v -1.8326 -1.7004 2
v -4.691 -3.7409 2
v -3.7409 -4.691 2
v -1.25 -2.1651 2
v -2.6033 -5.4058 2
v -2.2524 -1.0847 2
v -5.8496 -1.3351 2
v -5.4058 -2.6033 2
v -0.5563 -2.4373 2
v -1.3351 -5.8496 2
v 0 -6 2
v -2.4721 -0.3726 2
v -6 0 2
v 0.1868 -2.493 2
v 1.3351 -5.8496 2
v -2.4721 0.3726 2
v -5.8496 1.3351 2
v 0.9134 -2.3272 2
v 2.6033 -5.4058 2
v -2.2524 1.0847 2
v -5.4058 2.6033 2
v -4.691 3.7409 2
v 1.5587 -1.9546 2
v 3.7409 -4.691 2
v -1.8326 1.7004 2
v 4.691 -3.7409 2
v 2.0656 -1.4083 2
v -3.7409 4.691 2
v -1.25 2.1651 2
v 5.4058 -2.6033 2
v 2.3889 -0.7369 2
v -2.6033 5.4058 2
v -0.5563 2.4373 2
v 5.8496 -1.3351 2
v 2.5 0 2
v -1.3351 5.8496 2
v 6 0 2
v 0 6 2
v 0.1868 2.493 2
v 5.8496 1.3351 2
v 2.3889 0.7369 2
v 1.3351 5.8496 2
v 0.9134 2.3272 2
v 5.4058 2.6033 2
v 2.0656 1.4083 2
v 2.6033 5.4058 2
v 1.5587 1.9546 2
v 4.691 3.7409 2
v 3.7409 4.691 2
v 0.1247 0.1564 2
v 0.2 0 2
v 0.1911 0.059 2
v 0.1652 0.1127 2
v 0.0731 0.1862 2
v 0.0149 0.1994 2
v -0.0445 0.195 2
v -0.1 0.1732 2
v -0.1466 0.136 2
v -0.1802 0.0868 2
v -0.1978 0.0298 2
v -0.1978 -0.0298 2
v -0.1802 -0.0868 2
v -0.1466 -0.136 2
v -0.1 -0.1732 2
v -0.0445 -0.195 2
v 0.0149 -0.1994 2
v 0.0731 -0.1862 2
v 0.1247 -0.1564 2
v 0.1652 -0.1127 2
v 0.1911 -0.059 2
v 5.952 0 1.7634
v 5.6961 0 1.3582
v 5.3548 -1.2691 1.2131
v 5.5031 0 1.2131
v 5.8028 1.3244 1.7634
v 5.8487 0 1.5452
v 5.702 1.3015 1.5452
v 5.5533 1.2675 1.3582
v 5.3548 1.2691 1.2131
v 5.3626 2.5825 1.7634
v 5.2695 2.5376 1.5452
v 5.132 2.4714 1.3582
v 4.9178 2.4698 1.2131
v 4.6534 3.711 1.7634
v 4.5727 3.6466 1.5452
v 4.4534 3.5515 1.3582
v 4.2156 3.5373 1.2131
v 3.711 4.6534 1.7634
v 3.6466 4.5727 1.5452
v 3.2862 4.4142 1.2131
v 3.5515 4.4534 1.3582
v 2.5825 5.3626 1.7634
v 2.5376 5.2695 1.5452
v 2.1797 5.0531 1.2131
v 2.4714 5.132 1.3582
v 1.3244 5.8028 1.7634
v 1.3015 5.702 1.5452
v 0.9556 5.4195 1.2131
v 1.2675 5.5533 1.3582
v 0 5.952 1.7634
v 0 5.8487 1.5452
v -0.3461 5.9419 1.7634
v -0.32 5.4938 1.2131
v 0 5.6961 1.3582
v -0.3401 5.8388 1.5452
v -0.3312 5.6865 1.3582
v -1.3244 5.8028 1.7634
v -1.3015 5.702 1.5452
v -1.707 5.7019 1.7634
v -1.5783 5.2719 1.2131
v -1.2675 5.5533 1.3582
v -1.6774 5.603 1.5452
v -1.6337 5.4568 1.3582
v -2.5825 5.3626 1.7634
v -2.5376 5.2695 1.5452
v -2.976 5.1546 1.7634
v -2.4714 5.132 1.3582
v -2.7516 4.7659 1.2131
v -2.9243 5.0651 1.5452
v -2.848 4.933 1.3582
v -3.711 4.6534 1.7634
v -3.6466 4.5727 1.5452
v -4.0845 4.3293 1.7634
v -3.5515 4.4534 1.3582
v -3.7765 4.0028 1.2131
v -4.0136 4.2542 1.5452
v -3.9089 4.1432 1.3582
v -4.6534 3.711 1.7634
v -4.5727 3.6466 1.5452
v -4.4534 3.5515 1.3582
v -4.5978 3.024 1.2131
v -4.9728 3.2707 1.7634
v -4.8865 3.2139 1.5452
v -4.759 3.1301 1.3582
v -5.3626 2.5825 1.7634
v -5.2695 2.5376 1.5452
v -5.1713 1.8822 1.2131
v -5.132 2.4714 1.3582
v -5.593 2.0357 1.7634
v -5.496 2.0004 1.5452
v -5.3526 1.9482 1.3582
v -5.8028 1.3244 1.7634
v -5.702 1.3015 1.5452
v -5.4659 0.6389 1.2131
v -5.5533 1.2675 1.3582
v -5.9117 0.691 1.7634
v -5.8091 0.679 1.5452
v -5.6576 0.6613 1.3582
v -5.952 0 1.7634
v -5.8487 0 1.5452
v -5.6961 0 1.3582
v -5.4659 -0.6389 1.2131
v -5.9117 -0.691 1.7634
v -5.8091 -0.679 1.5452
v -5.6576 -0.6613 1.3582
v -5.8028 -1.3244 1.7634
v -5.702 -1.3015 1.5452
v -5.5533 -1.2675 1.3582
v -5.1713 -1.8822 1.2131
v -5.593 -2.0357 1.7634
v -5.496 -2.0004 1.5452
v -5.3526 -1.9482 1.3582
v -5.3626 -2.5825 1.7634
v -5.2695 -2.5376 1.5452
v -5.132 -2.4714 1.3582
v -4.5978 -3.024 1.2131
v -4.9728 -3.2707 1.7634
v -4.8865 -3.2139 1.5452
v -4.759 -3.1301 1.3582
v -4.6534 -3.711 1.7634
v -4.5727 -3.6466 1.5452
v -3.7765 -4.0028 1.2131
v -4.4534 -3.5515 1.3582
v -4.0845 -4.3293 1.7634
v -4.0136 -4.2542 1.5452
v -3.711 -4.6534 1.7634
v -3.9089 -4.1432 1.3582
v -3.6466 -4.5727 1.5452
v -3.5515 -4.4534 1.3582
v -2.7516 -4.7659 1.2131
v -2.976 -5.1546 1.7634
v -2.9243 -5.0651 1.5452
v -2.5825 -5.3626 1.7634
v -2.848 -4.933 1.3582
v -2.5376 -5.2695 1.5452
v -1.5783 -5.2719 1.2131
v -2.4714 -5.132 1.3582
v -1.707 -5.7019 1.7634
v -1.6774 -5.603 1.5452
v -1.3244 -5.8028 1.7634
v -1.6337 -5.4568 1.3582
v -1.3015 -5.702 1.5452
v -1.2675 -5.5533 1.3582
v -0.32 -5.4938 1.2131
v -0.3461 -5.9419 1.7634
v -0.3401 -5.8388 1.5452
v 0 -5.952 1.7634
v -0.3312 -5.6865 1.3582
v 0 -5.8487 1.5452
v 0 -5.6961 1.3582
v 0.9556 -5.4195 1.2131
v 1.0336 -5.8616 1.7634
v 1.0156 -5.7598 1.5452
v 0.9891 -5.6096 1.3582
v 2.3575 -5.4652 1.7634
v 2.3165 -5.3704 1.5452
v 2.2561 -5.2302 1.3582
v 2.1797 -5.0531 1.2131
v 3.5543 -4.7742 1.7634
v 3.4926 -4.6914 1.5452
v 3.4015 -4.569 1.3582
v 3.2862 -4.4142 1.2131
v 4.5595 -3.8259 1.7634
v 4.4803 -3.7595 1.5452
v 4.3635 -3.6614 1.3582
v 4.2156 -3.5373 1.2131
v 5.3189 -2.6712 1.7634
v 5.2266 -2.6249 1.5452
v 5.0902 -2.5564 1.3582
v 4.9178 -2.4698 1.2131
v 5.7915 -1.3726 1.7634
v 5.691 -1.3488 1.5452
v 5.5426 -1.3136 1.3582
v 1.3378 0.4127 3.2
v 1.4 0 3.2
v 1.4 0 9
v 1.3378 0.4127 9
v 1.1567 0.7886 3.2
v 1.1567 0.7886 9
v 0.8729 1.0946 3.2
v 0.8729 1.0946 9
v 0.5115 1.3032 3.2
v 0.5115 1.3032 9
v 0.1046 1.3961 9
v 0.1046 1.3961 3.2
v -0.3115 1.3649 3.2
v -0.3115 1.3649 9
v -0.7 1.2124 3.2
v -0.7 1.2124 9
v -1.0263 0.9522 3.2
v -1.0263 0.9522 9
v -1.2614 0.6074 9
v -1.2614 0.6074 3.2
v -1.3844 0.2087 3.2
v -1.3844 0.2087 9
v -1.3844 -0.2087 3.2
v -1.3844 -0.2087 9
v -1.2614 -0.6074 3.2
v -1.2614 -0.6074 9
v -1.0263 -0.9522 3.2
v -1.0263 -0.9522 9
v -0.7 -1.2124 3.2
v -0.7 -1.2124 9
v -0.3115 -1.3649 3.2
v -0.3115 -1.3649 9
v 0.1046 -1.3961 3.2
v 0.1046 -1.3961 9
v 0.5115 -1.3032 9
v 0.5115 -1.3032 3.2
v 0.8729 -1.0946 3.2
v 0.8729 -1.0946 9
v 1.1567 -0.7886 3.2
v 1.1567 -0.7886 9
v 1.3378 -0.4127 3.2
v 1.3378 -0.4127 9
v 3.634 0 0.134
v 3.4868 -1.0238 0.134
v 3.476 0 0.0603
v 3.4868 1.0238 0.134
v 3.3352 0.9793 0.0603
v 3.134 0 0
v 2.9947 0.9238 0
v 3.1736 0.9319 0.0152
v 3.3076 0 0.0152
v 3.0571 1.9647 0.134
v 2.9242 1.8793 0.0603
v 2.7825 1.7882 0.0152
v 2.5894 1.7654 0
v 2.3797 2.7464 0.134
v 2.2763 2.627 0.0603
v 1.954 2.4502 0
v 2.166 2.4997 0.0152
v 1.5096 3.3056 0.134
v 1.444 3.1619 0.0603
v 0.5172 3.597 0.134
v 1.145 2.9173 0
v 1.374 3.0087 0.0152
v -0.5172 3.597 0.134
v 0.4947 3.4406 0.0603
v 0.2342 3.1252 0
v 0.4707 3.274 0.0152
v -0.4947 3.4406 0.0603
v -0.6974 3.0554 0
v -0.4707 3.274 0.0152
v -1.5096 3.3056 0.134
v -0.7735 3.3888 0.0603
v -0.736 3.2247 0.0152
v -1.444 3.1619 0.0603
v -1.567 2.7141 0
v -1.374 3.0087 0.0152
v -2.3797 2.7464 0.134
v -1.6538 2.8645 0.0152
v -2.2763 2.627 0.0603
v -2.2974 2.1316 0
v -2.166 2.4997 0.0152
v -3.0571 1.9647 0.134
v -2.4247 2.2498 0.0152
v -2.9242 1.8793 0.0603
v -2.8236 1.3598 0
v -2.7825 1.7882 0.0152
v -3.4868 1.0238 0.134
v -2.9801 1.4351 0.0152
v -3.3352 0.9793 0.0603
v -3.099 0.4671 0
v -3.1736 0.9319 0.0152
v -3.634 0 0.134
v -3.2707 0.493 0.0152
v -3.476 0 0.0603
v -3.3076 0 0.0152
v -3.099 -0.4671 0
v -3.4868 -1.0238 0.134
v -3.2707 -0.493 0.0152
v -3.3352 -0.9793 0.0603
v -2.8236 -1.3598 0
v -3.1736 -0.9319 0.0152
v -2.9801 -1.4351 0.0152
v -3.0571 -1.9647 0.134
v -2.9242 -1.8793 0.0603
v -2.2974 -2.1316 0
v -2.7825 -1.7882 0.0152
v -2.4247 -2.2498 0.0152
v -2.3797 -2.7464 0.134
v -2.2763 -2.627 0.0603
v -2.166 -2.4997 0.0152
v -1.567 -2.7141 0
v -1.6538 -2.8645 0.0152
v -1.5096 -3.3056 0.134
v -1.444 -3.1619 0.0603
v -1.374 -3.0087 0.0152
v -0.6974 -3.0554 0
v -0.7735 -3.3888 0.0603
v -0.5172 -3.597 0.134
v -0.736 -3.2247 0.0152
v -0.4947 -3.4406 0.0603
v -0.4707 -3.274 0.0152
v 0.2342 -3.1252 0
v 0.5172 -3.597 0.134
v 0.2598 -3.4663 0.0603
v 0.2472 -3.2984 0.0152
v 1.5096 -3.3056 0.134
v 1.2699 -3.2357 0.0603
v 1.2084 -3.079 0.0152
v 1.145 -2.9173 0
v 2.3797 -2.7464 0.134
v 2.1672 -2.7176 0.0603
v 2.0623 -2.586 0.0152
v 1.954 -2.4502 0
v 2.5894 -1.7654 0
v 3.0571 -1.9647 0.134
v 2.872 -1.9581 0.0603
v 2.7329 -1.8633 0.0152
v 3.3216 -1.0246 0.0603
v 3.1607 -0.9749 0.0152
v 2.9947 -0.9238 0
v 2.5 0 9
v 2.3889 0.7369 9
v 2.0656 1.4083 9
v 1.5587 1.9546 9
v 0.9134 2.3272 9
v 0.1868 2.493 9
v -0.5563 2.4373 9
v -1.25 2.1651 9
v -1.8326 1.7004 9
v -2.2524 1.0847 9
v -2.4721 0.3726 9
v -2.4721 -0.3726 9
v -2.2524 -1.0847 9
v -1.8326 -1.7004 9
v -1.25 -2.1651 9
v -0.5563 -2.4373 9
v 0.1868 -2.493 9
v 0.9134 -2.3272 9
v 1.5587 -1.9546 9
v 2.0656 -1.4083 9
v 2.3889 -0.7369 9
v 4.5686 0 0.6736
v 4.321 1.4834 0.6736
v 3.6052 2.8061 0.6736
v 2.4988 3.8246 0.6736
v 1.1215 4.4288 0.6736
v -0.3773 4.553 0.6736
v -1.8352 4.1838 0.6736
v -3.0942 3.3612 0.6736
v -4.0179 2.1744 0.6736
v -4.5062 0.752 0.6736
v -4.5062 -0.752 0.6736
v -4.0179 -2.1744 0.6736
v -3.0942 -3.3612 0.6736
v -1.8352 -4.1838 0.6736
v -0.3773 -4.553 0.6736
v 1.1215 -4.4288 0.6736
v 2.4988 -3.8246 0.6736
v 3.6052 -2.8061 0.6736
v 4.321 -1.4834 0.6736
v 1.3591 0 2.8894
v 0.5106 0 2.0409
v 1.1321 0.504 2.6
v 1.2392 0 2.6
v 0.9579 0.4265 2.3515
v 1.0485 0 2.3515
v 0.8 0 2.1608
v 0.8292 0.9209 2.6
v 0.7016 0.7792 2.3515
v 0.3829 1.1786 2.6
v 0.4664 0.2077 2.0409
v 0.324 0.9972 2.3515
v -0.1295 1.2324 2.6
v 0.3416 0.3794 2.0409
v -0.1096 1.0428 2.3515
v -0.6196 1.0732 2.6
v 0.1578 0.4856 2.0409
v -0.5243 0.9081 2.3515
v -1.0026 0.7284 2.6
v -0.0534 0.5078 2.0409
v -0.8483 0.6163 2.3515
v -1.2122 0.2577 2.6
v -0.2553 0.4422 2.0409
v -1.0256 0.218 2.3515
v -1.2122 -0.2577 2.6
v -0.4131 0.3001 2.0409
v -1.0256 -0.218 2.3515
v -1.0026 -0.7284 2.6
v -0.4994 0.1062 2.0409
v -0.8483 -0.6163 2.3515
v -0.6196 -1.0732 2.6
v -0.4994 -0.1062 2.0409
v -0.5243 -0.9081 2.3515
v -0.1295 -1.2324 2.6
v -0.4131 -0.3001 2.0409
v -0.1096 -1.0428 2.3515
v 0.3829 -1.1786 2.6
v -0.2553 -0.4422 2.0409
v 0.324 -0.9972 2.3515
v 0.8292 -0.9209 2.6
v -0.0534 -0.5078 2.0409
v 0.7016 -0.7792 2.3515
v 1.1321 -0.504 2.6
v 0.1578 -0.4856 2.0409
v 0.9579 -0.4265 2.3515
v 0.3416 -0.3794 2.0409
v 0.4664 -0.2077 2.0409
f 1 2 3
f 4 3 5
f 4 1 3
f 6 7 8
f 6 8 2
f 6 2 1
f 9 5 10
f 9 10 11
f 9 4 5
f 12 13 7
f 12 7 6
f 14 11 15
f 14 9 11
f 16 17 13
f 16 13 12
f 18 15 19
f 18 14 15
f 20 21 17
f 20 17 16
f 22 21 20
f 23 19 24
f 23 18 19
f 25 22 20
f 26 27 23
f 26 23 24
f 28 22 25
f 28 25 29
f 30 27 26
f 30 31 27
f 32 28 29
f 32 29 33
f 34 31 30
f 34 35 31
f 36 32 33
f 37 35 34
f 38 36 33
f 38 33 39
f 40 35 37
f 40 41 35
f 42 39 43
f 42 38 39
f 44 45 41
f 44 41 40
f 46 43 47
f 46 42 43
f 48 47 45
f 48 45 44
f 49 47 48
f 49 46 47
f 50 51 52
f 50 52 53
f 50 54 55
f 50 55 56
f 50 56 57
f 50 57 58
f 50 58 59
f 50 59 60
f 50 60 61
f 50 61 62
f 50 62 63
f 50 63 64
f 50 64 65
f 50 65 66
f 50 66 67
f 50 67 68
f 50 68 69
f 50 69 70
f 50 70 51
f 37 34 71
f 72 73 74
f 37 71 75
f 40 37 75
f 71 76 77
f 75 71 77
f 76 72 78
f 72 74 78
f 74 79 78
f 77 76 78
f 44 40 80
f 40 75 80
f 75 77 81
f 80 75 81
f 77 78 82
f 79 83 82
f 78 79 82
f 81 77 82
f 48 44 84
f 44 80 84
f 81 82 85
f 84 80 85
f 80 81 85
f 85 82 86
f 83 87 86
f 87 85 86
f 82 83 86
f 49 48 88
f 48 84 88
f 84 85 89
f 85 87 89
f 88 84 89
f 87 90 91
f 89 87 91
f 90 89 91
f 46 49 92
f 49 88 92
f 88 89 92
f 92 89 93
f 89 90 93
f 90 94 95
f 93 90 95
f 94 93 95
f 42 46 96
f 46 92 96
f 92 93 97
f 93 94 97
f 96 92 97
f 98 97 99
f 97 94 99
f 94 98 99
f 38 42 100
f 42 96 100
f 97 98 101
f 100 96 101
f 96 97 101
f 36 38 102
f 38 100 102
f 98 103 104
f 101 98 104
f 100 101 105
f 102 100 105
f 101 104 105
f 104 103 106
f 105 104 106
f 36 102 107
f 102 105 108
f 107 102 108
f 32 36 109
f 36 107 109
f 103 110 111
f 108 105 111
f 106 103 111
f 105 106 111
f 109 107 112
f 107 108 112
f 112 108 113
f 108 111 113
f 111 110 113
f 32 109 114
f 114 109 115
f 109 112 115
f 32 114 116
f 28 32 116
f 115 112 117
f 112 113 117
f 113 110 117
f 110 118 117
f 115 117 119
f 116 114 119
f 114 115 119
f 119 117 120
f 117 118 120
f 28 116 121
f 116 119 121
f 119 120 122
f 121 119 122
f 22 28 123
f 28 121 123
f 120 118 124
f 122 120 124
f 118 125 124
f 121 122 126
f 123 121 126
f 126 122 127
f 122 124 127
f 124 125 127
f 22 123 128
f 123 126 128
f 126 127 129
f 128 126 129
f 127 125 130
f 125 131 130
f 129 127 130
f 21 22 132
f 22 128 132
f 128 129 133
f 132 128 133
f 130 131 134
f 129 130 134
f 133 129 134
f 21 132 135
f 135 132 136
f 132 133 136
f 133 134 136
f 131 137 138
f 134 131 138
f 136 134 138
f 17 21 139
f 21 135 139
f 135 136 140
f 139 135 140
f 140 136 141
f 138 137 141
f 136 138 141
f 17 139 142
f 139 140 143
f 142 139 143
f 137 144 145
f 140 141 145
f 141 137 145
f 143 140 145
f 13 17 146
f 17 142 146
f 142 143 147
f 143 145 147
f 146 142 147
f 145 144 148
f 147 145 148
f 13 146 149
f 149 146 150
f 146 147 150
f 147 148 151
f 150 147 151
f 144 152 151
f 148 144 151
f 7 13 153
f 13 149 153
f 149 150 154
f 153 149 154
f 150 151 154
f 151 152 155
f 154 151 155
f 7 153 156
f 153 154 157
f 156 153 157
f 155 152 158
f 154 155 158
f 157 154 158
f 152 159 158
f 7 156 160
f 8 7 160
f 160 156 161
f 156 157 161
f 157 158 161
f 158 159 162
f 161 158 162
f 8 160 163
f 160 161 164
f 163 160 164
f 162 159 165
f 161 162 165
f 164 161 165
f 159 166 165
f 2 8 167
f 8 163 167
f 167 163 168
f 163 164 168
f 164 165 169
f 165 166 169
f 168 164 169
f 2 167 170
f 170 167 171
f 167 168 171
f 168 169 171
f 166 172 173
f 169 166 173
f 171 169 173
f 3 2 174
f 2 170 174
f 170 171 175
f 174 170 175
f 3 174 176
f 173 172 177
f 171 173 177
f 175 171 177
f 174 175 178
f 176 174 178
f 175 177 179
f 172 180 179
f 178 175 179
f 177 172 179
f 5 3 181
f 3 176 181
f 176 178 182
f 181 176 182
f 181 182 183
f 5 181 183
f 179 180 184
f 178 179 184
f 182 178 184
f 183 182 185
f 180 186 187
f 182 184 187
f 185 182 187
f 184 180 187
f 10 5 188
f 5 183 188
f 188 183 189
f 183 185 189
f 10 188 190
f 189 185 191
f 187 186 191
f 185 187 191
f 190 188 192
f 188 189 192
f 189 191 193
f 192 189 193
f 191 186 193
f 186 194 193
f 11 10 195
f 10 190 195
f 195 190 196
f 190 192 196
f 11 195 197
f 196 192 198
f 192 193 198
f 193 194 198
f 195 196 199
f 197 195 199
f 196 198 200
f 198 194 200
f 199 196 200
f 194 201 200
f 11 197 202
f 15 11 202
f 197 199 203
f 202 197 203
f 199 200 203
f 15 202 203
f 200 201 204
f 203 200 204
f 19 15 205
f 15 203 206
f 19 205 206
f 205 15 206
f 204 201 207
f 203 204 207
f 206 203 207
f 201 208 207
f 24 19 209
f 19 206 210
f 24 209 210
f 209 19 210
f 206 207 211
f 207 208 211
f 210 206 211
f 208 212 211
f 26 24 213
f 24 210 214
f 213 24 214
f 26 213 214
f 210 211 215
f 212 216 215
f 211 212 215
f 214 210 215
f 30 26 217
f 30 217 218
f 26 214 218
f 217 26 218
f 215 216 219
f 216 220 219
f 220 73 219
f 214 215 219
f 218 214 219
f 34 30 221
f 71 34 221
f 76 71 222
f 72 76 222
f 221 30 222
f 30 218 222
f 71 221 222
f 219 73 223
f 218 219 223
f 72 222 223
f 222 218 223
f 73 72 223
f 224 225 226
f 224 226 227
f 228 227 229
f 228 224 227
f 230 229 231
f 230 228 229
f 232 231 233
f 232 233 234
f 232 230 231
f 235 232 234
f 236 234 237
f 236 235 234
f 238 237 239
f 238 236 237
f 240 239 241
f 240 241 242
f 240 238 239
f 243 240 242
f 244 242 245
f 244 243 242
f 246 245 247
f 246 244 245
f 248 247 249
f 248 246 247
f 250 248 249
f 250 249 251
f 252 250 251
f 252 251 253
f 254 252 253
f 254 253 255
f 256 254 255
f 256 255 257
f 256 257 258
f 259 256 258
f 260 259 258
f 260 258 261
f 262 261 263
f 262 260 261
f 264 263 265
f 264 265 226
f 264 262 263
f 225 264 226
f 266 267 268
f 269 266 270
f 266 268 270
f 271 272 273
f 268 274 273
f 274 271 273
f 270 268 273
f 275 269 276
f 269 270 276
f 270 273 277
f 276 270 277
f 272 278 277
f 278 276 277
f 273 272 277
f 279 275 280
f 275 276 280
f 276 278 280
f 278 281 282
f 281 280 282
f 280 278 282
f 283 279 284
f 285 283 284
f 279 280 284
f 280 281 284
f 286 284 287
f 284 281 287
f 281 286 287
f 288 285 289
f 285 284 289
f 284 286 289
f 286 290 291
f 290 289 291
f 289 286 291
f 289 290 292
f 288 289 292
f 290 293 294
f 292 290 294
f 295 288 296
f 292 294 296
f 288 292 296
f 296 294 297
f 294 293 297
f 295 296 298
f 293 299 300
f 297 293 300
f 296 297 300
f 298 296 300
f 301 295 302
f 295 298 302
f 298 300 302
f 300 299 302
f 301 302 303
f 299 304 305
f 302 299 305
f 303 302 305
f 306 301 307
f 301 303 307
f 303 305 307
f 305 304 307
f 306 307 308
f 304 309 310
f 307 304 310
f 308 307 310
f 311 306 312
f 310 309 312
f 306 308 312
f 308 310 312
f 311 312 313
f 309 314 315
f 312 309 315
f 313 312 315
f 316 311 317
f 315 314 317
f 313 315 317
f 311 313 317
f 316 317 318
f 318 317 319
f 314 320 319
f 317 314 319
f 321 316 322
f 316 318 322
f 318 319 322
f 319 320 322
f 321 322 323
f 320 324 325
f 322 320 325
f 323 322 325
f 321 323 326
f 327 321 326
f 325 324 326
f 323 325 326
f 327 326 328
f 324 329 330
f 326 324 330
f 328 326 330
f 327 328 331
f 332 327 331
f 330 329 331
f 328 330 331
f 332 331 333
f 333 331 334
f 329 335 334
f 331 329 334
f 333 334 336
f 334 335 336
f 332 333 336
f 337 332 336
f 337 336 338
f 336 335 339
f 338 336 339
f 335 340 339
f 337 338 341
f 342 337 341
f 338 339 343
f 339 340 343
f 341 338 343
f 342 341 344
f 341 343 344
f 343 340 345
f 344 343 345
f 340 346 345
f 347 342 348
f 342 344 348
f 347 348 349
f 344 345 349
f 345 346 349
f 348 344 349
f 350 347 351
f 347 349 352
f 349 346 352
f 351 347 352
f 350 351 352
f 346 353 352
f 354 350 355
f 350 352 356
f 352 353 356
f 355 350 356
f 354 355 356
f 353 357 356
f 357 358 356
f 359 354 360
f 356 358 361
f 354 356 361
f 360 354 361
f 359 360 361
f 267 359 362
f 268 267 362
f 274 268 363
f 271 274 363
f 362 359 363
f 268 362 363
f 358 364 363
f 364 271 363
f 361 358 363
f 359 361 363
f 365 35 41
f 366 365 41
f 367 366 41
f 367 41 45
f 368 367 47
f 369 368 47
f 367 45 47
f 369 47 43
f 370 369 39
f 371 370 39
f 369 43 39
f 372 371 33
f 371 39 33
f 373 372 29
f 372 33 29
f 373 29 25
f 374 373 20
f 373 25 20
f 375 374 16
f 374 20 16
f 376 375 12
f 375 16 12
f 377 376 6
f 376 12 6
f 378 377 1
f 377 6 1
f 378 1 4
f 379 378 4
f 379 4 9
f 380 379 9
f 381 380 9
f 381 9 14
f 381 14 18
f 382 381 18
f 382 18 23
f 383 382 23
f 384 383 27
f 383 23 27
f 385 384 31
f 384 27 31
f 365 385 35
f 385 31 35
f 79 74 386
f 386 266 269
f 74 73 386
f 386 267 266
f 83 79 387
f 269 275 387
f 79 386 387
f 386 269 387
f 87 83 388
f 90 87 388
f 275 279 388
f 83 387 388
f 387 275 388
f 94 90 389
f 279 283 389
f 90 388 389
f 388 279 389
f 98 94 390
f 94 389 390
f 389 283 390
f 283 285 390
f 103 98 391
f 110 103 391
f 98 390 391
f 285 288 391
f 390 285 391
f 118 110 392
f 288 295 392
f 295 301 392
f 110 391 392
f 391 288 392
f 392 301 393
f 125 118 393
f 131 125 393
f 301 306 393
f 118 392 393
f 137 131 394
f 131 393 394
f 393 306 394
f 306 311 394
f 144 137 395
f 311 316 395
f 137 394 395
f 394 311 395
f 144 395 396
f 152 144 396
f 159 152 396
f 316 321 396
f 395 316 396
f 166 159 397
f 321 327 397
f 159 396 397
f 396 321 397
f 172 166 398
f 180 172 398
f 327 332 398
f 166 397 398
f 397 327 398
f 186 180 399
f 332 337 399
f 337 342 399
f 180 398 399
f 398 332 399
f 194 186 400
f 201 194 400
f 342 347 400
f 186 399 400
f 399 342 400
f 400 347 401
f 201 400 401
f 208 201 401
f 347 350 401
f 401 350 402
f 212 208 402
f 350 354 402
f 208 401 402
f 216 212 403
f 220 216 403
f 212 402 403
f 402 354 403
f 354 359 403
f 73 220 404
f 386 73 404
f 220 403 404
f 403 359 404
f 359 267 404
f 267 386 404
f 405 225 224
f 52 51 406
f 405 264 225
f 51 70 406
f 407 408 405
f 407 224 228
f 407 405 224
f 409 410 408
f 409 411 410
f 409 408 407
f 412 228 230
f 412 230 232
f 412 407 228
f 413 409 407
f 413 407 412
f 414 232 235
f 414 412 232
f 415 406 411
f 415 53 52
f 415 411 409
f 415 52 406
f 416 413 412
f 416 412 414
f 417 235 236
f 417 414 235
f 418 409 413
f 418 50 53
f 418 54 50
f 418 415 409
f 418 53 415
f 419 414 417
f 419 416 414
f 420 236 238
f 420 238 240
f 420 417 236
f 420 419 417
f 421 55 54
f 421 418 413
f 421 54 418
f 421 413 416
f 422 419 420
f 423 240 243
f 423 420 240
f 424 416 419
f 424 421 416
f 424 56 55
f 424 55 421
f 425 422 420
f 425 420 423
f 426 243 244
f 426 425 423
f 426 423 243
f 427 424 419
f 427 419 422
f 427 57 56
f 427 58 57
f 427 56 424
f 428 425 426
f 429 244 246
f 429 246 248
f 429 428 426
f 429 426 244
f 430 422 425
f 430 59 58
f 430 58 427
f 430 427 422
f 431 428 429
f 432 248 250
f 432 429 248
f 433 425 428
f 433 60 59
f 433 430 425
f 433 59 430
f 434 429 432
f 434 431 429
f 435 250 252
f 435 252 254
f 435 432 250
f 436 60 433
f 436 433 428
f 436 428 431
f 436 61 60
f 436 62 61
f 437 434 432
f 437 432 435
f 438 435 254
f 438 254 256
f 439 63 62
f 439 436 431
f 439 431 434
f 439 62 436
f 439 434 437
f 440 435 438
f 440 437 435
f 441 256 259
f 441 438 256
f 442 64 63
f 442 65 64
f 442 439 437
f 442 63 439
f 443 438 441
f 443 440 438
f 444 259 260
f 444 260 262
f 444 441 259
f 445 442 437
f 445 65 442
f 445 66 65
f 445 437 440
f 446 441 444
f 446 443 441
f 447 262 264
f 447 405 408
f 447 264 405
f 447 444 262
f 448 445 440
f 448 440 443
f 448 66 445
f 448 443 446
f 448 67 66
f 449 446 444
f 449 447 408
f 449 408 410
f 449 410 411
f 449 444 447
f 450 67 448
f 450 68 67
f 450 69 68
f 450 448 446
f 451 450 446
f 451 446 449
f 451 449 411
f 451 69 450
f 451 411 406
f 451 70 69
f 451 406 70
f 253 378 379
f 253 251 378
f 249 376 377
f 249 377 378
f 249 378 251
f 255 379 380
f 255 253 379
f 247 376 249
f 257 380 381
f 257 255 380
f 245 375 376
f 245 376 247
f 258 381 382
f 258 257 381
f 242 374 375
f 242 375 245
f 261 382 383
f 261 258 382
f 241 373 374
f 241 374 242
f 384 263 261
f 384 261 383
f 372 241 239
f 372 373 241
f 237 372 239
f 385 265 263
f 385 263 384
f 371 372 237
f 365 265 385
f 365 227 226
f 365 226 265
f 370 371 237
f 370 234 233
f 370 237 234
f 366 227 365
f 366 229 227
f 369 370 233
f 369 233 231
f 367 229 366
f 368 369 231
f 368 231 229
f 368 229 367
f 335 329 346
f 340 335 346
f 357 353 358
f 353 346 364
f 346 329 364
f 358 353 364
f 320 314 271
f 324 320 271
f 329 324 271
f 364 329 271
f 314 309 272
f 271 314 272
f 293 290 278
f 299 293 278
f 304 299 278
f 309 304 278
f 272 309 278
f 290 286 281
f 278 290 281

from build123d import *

# Parameters (mm, degrees)
F0_R     = 6
F1_DEPTH = 2
F2_SIZE2 = 2.5980762114
F2_SIZE  = 1.5
F4_R     = 2.5
F4_R_2   = 1.4
F5_DEPTH = 7
F6_R     = 1.2


# Not quite as in the source:
# - a fillet or chamfer that OpenCascade refuses, or shapes differently, is made with other operations: its cross-section is extruded or revolved along the edge and cut away or added


with BuildPart() as f1:
    # F0 (on Top) → F1 (new body)
    with BuildSketch(Plane.XY):
        Circle(F0_R)
    extrude(amount=F1_DEPTH)

    # F2
    f2_edges = [f1.edges().sort_by_distance(p)[0] for p in [
        (-6, 0, 0),
    ]]
    f2_side = f1.faces().sort_by_distance((-6, 0, 1))[0]
    chamfer(f2_edges, length=F2_SIZE, length2=F2_SIZE2, reference=f2_side)

    # F3: fillet of radius 1 on 2 edges, made by hand

    # F3_s1 → F3_t2 (revolve, cut)
    with BuildSketch(Plane.XZ):
        with BuildLine():
            ThreePointArc((3.6339745962, 0.1339745962), (3.3927936413, 0.0340741737), (3.1339745962, 0))
            Line((3.1339745962, 0), (3.4019237886, 0))
            Line((3.4019237886, 0), (3.6339745962, 0.1339745962))
        make_face()
    revolve(axis=Axis((0, 0, 0), (0, 0, 1)), mode=Mode.SUBTRACT)

    # F3_s3 → F3_t4 (revolve, cut)
    with BuildSketch(Plane.XZ):
        with BuildLine():
            ThreePointArc((6, 2), (5.8486778537, 1.5452494356), (5.5031382462, 1.2131367327))
            Line((5.5031382462, 1.2131367327), (6, 1.5))
            Line((6, 1.5), (6, 2))
        make_face()
    revolve(axis=Axis((0, 0, 1.5), (0, 0, 1)), mode=Mode.SUBTRACT)

    # F4 (on face) → F5 (join)
    with BuildSketch(Plane.XY.offset(2)):
        Circle(F4_R)
        Circle(F4_R_2, mode=Mode.SUBTRACT)
    extrude(amount=F5_DEPTH)

    # F6
    f6_edges = [f1.edges().sort_by_distance(p)[0] for p in [
        (-1.4, 0, 2),
    ]]
    fillet(f6_edges, radius=F6_R)


solid = f1.part
